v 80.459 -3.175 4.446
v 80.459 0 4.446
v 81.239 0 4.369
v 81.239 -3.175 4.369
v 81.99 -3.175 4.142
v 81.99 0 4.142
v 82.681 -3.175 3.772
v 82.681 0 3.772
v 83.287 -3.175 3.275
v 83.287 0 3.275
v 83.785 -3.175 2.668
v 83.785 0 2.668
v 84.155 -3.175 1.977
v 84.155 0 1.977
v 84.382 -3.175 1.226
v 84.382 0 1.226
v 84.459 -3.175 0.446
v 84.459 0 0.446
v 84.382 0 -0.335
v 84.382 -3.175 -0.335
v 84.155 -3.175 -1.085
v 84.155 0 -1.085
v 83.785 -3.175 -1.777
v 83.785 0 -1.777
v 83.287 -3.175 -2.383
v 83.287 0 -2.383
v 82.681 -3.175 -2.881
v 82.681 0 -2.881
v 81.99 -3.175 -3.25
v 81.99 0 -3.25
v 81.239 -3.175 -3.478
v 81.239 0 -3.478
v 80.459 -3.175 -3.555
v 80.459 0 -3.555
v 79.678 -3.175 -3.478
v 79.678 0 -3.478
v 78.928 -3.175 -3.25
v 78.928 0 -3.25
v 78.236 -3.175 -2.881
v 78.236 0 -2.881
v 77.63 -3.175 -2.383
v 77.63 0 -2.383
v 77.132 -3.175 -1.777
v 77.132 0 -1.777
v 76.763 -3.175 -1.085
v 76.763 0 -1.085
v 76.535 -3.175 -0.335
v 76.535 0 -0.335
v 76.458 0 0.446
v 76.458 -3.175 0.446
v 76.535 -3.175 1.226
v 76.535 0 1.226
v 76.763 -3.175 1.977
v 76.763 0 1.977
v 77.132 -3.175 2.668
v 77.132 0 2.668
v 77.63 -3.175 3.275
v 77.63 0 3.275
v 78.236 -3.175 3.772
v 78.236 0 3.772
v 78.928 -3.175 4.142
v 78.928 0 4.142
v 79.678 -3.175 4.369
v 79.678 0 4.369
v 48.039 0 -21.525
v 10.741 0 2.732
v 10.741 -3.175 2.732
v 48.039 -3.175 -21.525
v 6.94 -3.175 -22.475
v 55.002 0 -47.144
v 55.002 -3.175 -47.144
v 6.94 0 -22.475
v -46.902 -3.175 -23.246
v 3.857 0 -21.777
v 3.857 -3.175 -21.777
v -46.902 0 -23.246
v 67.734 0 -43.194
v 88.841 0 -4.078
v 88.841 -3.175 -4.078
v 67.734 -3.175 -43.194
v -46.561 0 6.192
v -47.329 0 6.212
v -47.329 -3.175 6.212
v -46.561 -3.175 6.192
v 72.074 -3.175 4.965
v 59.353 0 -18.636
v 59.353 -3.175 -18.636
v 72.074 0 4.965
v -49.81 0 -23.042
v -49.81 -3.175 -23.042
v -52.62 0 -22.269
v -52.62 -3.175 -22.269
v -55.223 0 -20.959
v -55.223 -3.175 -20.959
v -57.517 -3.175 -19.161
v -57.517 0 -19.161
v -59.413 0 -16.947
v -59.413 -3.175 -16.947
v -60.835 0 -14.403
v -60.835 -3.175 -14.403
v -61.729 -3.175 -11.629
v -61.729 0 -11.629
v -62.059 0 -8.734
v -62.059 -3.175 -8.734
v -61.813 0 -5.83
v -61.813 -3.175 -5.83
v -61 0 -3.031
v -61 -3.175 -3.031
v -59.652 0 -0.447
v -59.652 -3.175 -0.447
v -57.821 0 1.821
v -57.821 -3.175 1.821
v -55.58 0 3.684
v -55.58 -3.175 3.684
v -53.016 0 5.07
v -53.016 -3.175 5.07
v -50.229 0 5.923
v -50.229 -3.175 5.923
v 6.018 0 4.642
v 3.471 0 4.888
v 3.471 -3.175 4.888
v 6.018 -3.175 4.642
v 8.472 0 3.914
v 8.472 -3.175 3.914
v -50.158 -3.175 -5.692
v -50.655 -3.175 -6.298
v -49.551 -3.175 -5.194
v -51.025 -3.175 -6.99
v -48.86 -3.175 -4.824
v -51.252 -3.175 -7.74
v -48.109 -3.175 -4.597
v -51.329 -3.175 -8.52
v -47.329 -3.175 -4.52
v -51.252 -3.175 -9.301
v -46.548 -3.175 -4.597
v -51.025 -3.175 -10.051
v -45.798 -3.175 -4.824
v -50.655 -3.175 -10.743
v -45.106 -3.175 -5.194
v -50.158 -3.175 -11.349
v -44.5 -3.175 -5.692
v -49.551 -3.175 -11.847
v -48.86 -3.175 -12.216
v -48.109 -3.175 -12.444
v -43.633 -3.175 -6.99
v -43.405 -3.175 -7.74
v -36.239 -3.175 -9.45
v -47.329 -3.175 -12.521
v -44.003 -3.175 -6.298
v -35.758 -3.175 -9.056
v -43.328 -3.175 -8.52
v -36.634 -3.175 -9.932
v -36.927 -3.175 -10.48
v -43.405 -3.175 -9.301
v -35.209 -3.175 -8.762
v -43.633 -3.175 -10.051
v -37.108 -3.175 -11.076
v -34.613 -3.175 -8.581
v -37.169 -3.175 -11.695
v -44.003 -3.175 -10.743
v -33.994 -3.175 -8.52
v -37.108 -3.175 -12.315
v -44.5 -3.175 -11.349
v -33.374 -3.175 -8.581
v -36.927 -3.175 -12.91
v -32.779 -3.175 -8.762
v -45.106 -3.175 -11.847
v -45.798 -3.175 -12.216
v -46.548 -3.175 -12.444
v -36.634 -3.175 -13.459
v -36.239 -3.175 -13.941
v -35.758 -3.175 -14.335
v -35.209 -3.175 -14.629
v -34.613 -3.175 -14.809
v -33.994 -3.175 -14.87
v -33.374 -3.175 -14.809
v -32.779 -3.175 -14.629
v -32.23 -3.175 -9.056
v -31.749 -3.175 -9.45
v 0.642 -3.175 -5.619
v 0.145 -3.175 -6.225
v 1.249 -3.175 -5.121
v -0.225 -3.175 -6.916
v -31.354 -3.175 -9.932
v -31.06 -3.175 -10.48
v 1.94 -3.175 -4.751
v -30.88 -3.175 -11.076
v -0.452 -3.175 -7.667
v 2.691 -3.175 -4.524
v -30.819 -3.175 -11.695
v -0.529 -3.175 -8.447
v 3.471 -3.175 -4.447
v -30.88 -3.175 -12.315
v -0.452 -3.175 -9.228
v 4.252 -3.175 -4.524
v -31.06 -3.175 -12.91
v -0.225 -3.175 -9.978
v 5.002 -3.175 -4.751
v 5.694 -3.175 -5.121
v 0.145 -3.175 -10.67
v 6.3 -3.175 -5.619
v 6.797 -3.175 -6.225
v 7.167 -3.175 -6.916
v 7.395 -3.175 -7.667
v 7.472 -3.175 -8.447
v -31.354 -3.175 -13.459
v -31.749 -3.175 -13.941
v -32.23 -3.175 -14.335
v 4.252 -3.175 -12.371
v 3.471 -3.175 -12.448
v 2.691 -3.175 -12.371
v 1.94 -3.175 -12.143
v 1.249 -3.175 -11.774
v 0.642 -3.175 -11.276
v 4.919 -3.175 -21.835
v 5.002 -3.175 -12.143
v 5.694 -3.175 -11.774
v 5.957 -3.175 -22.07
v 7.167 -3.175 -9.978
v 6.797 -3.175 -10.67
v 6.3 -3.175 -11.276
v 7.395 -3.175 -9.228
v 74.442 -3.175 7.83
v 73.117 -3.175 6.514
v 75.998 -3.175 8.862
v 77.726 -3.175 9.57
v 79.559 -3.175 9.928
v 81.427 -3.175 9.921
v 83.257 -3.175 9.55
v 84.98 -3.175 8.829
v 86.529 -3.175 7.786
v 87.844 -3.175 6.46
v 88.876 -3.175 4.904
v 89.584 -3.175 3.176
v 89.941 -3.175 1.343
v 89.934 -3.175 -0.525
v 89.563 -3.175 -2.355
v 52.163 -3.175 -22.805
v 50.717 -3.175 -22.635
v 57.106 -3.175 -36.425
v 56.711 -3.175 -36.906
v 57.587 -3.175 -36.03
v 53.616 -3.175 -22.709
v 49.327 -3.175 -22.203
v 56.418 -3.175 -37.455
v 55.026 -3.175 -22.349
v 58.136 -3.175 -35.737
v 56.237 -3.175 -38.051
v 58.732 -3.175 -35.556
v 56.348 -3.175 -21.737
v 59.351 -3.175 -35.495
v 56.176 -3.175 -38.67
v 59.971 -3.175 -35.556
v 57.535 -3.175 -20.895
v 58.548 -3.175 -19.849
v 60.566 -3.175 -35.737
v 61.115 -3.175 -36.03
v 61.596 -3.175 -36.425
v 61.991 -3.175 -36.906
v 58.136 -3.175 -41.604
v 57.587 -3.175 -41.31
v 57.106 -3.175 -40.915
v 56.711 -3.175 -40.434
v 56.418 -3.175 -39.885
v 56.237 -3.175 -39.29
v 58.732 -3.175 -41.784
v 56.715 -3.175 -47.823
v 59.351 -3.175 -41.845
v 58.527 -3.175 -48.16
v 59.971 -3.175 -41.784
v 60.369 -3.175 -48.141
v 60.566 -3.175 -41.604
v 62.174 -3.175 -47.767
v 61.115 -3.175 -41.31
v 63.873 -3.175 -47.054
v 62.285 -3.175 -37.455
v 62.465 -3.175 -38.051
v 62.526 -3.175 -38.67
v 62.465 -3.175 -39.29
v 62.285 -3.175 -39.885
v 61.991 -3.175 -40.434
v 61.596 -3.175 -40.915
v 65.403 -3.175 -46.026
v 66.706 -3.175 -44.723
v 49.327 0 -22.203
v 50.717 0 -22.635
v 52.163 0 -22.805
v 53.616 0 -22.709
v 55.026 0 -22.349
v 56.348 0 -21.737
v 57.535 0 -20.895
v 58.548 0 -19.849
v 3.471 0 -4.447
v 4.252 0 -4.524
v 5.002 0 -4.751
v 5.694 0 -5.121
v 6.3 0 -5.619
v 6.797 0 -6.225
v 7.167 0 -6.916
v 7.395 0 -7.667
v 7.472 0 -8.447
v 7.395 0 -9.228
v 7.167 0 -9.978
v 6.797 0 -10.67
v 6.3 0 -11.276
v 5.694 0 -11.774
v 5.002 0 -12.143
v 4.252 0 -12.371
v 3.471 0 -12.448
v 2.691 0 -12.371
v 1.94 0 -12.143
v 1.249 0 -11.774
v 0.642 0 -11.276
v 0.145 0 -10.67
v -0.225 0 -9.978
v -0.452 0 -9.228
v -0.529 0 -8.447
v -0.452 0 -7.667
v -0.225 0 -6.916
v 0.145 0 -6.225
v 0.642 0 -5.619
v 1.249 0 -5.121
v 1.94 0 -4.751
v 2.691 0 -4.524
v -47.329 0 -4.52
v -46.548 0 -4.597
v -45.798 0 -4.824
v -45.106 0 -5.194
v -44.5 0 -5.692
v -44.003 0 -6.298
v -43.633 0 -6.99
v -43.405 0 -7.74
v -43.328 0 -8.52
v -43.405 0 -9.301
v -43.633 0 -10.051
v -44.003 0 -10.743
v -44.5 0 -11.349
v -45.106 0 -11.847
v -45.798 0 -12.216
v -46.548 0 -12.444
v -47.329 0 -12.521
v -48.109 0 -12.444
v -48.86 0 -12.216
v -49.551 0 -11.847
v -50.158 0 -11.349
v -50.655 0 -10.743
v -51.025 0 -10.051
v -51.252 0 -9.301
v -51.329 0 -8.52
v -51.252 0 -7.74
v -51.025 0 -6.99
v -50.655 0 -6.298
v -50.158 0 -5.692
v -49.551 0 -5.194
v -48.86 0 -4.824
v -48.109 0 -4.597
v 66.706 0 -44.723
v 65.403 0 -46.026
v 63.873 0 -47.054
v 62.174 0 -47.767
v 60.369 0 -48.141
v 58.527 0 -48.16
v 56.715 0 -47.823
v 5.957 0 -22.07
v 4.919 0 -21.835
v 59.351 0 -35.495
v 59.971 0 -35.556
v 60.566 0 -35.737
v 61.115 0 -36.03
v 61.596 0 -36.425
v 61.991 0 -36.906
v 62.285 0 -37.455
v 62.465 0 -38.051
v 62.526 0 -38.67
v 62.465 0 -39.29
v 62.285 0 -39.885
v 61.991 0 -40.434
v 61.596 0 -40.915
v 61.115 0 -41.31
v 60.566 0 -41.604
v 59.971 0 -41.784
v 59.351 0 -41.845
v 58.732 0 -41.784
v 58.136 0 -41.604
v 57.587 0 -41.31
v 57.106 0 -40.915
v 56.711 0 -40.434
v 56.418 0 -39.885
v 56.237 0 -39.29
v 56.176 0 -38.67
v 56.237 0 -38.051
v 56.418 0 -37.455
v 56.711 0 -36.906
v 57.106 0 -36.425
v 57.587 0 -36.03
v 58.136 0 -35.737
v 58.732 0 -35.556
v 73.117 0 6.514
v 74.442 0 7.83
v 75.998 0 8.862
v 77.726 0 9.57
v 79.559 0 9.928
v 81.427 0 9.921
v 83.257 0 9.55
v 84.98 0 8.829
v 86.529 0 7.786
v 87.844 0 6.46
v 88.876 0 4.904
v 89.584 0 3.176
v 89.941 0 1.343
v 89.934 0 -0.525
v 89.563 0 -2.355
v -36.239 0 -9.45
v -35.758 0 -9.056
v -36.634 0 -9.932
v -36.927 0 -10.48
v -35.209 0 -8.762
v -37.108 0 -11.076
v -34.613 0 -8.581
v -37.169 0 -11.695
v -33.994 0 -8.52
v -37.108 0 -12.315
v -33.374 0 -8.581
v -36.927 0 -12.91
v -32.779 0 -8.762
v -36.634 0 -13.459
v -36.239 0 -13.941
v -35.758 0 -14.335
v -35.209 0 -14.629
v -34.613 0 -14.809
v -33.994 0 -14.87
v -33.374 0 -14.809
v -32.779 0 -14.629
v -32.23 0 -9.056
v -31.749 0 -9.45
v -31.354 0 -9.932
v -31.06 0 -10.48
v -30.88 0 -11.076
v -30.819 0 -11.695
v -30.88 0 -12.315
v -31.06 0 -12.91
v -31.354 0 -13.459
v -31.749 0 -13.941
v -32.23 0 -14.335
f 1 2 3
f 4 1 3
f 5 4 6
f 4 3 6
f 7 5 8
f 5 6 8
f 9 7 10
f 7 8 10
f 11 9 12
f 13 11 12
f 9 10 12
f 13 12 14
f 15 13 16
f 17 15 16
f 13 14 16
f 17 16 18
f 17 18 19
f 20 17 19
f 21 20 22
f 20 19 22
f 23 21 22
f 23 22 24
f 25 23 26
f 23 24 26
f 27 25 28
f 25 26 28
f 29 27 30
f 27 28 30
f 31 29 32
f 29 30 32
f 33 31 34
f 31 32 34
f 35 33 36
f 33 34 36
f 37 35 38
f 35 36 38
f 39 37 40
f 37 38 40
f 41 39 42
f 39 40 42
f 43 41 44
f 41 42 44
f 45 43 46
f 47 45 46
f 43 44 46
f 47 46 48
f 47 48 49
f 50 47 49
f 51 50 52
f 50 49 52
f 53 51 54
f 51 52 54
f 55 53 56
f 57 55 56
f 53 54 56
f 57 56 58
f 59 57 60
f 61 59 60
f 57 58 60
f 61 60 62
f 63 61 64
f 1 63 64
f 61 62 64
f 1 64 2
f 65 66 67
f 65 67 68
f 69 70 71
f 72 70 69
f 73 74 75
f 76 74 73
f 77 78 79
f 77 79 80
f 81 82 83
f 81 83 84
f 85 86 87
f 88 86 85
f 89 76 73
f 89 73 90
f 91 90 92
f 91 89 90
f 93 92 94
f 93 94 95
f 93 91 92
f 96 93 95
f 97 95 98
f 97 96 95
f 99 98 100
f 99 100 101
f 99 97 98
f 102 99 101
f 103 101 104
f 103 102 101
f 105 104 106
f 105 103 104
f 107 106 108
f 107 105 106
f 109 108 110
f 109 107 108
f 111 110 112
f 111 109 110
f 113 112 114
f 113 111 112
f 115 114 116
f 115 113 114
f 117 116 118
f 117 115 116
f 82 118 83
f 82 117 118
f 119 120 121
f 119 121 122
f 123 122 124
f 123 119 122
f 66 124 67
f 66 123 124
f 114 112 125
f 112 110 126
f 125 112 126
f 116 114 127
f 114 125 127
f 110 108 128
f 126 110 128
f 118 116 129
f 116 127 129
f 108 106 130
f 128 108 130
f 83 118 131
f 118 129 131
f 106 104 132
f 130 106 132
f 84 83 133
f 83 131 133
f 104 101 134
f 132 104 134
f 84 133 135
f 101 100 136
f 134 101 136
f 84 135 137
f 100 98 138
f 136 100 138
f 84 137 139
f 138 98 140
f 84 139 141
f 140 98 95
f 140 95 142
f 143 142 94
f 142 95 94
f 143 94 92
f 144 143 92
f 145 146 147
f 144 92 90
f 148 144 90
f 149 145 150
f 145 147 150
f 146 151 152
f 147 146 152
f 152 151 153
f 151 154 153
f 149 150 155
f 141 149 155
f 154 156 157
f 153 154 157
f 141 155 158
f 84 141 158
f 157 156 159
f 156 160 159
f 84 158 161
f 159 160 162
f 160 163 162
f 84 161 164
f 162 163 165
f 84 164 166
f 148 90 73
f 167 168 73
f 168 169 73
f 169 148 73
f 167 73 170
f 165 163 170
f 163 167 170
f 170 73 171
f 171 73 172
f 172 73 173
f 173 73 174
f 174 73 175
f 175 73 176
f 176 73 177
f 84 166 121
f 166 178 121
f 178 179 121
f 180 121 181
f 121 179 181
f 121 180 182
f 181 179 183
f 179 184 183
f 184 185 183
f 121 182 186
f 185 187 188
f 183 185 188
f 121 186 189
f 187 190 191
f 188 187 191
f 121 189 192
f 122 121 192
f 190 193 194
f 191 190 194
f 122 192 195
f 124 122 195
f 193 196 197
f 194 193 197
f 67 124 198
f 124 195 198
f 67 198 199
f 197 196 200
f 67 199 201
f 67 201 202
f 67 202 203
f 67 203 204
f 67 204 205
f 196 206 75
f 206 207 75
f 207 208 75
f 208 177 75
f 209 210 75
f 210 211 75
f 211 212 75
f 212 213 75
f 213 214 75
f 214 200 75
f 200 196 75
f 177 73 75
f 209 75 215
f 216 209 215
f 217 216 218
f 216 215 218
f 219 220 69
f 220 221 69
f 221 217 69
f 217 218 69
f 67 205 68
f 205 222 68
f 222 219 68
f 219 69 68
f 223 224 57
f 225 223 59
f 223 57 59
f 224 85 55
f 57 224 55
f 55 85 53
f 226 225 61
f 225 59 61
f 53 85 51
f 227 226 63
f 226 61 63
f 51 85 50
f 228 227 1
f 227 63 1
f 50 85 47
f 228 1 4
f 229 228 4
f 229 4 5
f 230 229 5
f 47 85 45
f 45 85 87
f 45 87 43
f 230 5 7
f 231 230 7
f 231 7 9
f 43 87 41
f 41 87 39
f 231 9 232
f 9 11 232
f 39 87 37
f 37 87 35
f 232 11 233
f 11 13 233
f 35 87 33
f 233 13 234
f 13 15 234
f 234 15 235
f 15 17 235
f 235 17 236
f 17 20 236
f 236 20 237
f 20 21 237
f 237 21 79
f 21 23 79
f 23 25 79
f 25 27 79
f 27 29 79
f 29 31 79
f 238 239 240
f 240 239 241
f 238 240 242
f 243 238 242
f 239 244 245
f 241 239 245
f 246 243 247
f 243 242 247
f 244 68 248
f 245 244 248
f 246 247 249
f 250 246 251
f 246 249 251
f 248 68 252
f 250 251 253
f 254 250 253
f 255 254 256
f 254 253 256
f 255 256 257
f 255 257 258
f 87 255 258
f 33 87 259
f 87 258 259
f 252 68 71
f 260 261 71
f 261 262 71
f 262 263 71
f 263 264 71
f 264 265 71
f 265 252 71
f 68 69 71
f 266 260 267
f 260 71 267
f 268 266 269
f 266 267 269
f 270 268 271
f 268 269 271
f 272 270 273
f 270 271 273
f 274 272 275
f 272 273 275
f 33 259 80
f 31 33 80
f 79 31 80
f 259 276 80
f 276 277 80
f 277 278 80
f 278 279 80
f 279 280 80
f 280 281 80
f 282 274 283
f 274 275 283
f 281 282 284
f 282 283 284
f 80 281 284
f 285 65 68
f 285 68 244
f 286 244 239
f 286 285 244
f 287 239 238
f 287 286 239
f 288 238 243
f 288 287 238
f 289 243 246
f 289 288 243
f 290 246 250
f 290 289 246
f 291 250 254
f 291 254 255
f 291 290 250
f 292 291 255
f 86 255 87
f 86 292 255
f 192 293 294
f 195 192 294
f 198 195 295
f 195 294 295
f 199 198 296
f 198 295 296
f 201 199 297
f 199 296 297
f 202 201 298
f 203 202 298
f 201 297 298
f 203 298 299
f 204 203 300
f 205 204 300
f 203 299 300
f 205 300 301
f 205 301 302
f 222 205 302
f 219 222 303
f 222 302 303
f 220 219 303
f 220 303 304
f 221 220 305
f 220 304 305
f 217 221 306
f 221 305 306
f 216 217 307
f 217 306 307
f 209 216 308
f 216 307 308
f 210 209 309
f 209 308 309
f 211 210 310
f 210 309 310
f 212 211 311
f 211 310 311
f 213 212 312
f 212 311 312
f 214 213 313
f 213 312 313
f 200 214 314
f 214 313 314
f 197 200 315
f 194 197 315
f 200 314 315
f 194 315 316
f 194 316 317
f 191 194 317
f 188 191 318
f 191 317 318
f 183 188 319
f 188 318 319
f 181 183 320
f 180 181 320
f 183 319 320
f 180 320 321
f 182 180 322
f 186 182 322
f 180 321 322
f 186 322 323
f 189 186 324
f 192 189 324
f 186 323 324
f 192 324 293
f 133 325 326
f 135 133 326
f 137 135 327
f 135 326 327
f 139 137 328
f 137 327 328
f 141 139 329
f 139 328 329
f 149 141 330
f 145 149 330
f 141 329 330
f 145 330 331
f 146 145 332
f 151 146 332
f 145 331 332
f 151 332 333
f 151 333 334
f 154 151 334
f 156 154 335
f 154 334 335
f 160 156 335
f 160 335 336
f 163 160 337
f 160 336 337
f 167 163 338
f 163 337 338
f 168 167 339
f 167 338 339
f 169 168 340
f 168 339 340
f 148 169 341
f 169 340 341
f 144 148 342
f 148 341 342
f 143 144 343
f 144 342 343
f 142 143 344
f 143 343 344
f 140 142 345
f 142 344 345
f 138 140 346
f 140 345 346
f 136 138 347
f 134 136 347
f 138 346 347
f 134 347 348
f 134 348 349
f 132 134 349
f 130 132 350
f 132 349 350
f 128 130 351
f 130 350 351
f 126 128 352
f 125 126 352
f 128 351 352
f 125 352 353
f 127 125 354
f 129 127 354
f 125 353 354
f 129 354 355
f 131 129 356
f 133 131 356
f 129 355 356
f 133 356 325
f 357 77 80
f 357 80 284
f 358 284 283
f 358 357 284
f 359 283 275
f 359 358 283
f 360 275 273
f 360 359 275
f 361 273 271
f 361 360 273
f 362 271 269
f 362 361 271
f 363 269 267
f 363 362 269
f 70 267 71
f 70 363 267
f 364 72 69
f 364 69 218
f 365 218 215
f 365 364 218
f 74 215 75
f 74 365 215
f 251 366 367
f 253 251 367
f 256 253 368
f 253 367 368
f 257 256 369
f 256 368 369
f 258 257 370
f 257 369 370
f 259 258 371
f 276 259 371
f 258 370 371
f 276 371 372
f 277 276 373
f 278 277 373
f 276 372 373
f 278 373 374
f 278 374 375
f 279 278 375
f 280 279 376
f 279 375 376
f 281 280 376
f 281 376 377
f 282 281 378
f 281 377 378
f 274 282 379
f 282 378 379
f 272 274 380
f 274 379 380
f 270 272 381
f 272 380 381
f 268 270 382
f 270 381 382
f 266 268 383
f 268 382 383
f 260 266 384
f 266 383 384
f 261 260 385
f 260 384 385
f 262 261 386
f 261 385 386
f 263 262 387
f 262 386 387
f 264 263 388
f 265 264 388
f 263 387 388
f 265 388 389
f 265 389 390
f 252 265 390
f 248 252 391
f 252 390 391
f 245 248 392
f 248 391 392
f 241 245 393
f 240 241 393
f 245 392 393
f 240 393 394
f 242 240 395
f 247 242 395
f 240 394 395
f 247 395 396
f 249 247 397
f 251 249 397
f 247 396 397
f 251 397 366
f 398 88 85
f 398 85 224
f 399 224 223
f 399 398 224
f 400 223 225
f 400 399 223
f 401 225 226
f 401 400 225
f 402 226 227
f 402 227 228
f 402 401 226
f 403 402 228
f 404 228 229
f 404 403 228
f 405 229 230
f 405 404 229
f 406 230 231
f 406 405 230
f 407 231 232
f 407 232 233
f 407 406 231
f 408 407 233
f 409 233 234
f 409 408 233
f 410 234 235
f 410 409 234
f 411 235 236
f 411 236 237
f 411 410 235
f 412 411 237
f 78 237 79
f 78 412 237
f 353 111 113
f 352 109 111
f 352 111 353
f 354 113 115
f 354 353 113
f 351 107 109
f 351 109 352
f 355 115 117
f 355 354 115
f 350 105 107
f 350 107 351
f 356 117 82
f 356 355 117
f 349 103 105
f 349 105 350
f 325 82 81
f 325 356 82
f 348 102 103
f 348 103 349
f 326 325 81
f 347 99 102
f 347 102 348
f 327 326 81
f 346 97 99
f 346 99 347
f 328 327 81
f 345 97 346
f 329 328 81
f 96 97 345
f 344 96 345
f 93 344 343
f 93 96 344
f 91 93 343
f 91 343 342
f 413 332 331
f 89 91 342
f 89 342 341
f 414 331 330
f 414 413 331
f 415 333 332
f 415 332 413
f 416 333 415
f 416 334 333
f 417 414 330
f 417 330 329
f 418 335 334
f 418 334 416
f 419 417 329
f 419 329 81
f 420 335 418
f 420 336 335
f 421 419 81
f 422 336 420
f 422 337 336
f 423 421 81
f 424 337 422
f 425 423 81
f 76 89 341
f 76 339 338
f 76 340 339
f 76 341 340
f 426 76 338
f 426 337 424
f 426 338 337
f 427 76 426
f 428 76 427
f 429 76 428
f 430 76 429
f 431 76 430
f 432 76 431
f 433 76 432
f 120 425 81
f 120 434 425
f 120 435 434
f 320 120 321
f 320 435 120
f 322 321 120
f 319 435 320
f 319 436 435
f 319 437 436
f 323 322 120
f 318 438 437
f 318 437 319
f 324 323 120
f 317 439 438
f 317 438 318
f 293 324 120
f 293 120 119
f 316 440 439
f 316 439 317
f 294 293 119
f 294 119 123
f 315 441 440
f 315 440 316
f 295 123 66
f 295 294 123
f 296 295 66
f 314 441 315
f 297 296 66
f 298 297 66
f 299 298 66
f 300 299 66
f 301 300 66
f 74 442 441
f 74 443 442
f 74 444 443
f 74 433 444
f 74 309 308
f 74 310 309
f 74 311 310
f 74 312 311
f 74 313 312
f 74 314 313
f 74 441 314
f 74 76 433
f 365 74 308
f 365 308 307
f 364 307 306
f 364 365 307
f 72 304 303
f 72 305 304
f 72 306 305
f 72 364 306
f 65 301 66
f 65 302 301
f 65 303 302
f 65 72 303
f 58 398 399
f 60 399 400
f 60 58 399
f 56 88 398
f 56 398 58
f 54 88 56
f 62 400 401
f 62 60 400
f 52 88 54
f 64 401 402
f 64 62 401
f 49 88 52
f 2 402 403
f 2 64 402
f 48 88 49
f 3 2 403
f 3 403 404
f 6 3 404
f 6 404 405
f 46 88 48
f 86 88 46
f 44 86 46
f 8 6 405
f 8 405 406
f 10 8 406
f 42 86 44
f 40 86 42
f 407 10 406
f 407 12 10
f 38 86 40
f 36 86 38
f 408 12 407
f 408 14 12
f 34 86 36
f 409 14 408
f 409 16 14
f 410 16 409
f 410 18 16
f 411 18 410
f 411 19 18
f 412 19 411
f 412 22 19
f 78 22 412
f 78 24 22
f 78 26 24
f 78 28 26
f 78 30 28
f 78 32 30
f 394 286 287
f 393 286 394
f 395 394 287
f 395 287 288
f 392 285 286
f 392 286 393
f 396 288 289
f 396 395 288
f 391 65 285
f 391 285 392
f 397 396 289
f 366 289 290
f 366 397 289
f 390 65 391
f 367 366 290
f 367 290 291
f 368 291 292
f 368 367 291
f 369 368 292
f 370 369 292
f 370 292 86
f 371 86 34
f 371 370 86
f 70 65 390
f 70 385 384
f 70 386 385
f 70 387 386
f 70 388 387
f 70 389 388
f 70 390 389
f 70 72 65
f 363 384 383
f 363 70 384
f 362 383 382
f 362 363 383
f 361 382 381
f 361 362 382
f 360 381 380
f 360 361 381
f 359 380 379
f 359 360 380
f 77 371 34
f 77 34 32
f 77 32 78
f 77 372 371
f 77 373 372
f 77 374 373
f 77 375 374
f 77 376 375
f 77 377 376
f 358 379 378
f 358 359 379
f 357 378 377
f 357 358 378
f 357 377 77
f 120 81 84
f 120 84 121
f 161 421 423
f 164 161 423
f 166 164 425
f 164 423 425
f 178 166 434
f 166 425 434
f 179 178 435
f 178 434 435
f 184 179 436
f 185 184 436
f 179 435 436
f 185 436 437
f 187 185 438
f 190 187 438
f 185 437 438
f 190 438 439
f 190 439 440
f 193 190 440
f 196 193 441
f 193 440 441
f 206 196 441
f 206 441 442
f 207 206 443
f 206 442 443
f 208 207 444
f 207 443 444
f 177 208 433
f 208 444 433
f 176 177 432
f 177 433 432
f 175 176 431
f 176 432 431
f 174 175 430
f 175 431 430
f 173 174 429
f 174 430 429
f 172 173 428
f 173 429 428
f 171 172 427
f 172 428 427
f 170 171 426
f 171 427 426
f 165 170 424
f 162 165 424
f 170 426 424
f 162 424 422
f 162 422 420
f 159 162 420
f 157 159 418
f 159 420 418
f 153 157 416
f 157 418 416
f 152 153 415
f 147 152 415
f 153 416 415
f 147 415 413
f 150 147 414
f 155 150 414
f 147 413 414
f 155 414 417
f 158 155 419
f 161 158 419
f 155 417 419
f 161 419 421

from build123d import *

# Parameters (mm, degrees)
SKETCH1_R           = 4.0005
SKETCH1_R_2         = 3.175
BOSS_EXTRUDE1_DEPTH = 3.175


with BuildPart() as part:
    # Sketch1 → Boss-Extrude1 (new body)
    with BuildSketch(Plane(origin=(0, 0, 0), x_dir=(1, 0, 0), z_dir=(0, 1, 0))):
        with BuildLine():
            ThreePointArc((-46.902498527, 23.246309683), (-62.059272503, 8.733659936), (-47.328815007, -6.211520625))
            Line((-47.328815007, -6.211520625), (-46.561465221, -6.19152247))
            Line((-46.561465221, -6.19152247), (3.471132419, -4.887606539))
            ThreePointArc((3.471132419, -4.887606539), (7.262671761, -4.337224423), (10.741230908, -2.731510464))
            Line((10.741230908, -2.731510464), (48.038745416, 21.524588854))
            ThreePointArc((48.038745416, 21.524588854), (54.329351234, 22.561375589), (59.353430379, 18.636419917))
            Line((59.353430379, 18.636419917), (72.07389053, -4.964849275))
            ThreePointArc((72.07389053, -4.964849275), (84.979781777, -8.82930009), (88.84104895, 4.077544017))
            Line((88.84104895, 4.077544017), (67.73364895, 43.193544017))
            ThreePointArc((67.73364895, 43.193544017), (62.173939186, 47.767404403), (55.001620384, 47.144175333))
            Line((55.001620384, 47.144175333), (6.940489179, 22.474885504))
            ThreePointArc((6.940489179, 22.474885504), (5.442894785, 21.93088115), (3.857022336, 21.776808826))
            Line((3.857022336, 21.776808826), (-46.902498527, 23.246309683))
        make_face()
        with Locations(Location((-47.328815007, 8.520479375, 0), (0, 0, 270))):
            Circle(SKETCH1_R, mode=Mode.SUBTRACT)
        with Locations(Location((-33.993815007, 11.695479375, 0), (0, 0, 270))):
            Circle(SKETCH1_R_2, mode=Mode.SUBTRACT)
        with Locations(Location((3.471132419, 8.447393461, 0), (0, 0, 270))):
            Circle(SKETCH1_R, mode=Mode.SUBTRACT)
        with Locations(Location((80.458584993, -0.445720625, 0), (0, 0, 270))):
            Circle(SKETCH1_R, mode=Mode.SUBTRACT)
        with Locations(Location((59.351184993, 38.670279375, 0), (0, 0, 270))):
            Circle(SKETCH1_R_2, mode=Mode.SUBTRACT)
    extrude(amount=-BOSS_EXTRUDE1_DEPTH)


solid = part.part
